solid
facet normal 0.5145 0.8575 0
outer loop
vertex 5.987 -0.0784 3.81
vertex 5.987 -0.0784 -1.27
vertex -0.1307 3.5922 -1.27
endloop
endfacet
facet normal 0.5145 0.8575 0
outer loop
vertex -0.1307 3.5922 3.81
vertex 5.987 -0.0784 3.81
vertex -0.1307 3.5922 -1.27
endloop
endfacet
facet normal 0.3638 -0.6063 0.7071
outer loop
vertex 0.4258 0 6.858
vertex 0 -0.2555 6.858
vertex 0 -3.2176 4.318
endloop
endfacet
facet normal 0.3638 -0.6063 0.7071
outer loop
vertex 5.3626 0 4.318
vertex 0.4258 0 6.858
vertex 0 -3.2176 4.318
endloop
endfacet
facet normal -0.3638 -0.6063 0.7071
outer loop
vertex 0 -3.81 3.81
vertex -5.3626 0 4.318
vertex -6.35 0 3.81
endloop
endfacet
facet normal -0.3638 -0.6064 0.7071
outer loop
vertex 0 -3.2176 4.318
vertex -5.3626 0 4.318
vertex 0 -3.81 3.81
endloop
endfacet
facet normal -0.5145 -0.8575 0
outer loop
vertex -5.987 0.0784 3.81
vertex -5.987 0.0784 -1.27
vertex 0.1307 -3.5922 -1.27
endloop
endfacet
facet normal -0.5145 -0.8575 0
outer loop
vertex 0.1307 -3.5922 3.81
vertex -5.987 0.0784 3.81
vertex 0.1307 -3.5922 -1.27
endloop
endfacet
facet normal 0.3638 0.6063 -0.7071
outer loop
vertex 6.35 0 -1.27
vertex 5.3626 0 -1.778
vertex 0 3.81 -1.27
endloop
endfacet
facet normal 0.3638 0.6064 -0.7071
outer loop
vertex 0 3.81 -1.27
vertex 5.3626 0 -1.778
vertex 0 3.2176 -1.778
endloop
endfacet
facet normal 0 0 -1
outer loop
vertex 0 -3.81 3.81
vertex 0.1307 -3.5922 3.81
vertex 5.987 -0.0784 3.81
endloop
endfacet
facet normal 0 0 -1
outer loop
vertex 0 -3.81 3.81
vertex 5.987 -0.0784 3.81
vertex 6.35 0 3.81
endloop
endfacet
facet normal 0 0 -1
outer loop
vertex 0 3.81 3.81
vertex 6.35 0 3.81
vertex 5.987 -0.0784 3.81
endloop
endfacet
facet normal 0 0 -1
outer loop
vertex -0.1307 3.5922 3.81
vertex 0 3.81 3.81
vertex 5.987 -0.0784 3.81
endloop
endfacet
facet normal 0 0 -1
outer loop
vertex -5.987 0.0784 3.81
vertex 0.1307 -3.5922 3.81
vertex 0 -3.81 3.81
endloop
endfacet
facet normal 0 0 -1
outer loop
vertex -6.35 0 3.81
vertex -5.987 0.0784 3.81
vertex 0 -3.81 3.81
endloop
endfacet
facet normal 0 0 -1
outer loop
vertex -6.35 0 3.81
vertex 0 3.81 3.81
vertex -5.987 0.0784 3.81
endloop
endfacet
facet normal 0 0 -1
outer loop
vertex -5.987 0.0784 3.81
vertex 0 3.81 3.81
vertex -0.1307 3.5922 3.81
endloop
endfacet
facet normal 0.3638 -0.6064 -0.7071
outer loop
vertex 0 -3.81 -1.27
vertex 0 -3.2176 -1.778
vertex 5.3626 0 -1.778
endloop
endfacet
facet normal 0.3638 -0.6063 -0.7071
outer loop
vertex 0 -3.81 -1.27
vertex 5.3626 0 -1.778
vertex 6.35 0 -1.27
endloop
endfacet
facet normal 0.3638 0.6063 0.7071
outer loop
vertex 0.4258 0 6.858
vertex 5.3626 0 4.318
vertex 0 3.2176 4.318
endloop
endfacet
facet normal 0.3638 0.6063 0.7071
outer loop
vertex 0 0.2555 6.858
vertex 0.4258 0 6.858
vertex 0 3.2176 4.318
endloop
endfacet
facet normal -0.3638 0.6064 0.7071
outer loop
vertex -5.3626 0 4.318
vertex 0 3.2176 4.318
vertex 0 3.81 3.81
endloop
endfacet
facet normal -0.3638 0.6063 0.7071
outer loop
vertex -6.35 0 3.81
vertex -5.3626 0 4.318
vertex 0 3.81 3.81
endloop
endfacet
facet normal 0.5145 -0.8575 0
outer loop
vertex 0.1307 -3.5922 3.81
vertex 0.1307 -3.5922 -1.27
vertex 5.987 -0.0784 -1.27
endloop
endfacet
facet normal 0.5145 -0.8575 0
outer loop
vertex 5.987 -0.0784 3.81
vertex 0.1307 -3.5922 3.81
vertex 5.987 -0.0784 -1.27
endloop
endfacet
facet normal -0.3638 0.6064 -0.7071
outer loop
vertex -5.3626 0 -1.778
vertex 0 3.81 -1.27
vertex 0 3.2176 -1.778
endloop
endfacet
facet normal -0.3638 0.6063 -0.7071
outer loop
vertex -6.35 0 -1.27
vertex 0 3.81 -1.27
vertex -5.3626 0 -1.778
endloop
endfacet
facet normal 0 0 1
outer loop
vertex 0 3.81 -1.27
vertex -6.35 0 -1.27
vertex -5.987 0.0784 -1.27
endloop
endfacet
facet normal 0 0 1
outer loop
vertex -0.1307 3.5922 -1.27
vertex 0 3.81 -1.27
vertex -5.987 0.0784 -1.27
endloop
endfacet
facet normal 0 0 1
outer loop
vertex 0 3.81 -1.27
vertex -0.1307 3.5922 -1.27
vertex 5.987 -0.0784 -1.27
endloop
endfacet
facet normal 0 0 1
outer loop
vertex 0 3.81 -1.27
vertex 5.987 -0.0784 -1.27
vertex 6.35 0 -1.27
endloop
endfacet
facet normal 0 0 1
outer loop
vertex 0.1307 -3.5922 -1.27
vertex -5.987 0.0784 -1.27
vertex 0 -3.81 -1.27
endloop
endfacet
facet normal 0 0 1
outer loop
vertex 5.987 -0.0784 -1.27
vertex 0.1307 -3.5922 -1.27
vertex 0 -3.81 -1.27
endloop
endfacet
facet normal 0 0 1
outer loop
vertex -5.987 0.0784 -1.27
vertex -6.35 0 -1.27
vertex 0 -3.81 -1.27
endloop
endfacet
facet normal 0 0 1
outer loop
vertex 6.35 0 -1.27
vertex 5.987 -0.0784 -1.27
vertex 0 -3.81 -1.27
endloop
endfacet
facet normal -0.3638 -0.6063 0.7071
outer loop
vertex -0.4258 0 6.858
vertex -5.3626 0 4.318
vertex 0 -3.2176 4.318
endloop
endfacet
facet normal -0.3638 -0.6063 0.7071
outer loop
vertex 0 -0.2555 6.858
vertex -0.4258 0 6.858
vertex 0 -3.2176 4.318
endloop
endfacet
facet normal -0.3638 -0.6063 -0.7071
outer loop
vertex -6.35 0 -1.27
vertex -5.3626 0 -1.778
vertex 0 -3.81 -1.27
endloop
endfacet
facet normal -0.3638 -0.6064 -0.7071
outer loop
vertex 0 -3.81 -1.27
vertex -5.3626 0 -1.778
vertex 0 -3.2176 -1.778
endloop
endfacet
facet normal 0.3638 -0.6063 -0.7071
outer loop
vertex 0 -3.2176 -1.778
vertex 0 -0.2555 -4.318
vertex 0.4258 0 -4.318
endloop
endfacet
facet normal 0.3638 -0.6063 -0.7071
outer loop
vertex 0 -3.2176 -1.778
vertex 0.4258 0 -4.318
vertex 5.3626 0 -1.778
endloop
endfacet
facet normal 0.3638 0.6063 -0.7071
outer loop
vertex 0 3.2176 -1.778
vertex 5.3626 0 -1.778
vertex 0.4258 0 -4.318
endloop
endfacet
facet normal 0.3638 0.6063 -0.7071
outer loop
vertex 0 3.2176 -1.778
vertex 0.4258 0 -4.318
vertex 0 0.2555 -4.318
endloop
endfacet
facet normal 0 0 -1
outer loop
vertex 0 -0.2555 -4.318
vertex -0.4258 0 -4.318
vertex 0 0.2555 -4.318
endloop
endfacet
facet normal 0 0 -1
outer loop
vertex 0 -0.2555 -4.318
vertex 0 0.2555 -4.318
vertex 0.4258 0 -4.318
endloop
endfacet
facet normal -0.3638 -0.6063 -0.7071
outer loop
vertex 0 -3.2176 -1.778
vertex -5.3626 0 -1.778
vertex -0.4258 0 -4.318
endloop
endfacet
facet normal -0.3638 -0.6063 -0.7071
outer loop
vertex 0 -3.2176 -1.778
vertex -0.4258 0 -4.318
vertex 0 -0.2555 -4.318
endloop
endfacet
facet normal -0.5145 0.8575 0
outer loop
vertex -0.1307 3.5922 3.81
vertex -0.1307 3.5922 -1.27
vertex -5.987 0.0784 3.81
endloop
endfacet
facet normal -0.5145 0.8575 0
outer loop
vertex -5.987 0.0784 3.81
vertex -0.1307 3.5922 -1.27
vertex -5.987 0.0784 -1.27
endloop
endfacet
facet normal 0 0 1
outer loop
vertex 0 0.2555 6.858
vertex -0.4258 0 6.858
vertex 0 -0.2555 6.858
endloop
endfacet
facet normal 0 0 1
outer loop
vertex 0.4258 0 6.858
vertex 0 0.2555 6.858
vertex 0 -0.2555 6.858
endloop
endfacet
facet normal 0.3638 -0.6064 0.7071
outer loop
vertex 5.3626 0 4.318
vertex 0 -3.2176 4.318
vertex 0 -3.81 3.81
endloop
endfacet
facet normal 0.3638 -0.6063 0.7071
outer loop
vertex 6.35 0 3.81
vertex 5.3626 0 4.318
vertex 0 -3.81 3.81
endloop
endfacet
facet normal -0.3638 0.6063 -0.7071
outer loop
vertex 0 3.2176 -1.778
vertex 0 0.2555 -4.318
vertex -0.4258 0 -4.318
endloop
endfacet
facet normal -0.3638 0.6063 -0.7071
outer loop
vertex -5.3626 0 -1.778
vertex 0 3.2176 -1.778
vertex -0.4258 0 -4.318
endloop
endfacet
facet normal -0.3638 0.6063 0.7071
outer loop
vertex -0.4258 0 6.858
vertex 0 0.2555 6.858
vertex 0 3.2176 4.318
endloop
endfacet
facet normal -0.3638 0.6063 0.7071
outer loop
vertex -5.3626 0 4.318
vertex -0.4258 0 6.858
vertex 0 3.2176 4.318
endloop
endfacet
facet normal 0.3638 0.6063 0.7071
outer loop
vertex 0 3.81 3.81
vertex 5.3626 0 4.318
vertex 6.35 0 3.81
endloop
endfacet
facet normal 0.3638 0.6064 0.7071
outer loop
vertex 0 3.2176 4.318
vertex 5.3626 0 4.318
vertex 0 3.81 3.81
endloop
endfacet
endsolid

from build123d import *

# Parameters (mm, degrees)
F1_DEPTH  = 4.318
F2_DEPTH  = 1.778
F3_SIZE   = 0.508
F4_SIZE   = 0.508
F5_SIZE   = 0.508
F6_DEPTH  = 2.54
F7_DEPTH  = 2.54
F8_SIZE   = 2.53999
F9_SIZE   = 2.53999
F11_DEPTH = 0.254
F12_DEPTH = 0.254


# Not quite as in the source:
# - a fillet or chamfer is up to 0.001 mm smaller than in the source, because OpenCascade refuses the exact size
# - a feature names something its author has since deleted; it is built from what else it names


with BuildPart() as f1:
    # F0 (on Top) → F1 (new body)
    with BuildSketch(Plane.XY):
        Polygon((-6.35, 0), (0, 0), (0, 3.81), align=None)
        Polygon((0, 3.81), (0, 0), (6.35, 0), align=None)
        Polygon((6.35, 0), (0, 0), (0, -3.81), align=None)
        Polygon((0, -3.81), (0, 0), (-6.35, 0), align=None)
    extrude(amount=F1_DEPTH)

    # F5
    f5_edges = [f1.edges().sort_by_distance(p)[0] for p in [
        (-3.175, -1.905, 4.318),
        (3.175, -1.905, 4.318),
        (3.175, 1.905, 4.318),
        (-3.175, 1.905, 4.318),
    ]]
    chamfer(f5_edges, length=F5_SIZE)

    # F7 (add): a face of the model
    f7_faces = [f1.faces().sort_by_distance(p)[0] for p in [
        (0, 0, 4.318),
    ]]
    extrude(f7_faces, amount=F7_DEPTH)

    # F8 (size 2.54 in the source; OpenCascade refuses exactly that, so slightly less here)
    f8_edges = [f1.edges().sort_by_distance(p)[0] for p in [
        (-2.681313, -1.608788, 6.858),
        (-2.681313, 1.608788, 6.858),
        (2.681313, -1.608788, 6.858),
        (2.681313, 1.608788, 6.858),
    ]]
    chamfer(f8_edges, length=F8_SIZE)


with BuildPart() as f2:
    # F0 (on Top) → F2 (new body)
    with BuildSketch(Plane.XY):
        Polygon((6.35, 0), (0, 0), (0, -3.81), align=None)
        Polygon((0, -3.81), (0, 0), (-6.35, 0), align=None)
        Polygon((0, 3.81), (0, 0), (6.35, 0), align=None)
        Polygon((-6.35, 0), (0, 0), (0, 3.81), align=None)
    extrude(amount=-F2_DEPTH)

    # F3
    f3_edges = [f2.edges().sort_by_distance(p)[0] for p in [
        (3.175, 1.905, -1.778),
        (3.175, -1.905, -1.778),
    ]]
    chamfer(f3_edges, length=F3_SIZE)

    # F4
    f4_edges = [f2.edges().sort_by_distance(p)[0] for p in [
        (-3.421844, 1.756894, -1.778),
        (-3.421844, -1.756894, -1.778),
    ]]
    chamfer(f4_edges, length=F4_SIZE)

    # F6 (add): a face of the model
    f6_faces = [f2.faces().sort_by_distance(p)[0] for p in [
        (0, 0, -1.778),
    ]]
    extrude(f6_faces, amount=F6_DEPTH)

    # F9 (size 2.54 in the source; OpenCascade refuses exactly that, so slightly less here)
    f9_edges = [f2.edges().sort_by_distance(p)[0] for p in [
        (2.681313, 1.608788, -4.318),
        (-2.681313, 1.608788, -4.318),
        (2.681313, -1.608788, -4.318),
        (-2.681313, -1.608788, -4.318),
    ]]
    chamfer(f9_edges, length=F9_SIZE)

    # F10: union F1
    add(f1.part)

    # F11 (cut): faces of the model
    f11_faces = [f2.faces().sort_by_distance(p)[0] for p in [
        (3.175, 1.905, 1.27),
        (-3.175, 1.905, 1.27),
        (-3.175, -1.905, 1.27),
        (3.175, -1.905, 1.27),
    ]]
    extrude(f11_faces, amount=-F11_DEPTH, dir=(0.5144957554, 0.8574929257, 0), mode=Mode.SUBTRACT)

    # F12 (cut): faces of the model
    f12_faces = [f2.faces().sort_by_distance(p)[0] for p in [
        (-3.1169191458, -1.9398485125, 1.27),
        (3.0515781849, -1.9790530891, 1.27),
    ]]
    extrude(f12_faces, amount=-F12_DEPTH, dir=(-0.5144957554, -0.8574929257, 0), mode=Mode.SUBTRACT)


solid = f2.part
